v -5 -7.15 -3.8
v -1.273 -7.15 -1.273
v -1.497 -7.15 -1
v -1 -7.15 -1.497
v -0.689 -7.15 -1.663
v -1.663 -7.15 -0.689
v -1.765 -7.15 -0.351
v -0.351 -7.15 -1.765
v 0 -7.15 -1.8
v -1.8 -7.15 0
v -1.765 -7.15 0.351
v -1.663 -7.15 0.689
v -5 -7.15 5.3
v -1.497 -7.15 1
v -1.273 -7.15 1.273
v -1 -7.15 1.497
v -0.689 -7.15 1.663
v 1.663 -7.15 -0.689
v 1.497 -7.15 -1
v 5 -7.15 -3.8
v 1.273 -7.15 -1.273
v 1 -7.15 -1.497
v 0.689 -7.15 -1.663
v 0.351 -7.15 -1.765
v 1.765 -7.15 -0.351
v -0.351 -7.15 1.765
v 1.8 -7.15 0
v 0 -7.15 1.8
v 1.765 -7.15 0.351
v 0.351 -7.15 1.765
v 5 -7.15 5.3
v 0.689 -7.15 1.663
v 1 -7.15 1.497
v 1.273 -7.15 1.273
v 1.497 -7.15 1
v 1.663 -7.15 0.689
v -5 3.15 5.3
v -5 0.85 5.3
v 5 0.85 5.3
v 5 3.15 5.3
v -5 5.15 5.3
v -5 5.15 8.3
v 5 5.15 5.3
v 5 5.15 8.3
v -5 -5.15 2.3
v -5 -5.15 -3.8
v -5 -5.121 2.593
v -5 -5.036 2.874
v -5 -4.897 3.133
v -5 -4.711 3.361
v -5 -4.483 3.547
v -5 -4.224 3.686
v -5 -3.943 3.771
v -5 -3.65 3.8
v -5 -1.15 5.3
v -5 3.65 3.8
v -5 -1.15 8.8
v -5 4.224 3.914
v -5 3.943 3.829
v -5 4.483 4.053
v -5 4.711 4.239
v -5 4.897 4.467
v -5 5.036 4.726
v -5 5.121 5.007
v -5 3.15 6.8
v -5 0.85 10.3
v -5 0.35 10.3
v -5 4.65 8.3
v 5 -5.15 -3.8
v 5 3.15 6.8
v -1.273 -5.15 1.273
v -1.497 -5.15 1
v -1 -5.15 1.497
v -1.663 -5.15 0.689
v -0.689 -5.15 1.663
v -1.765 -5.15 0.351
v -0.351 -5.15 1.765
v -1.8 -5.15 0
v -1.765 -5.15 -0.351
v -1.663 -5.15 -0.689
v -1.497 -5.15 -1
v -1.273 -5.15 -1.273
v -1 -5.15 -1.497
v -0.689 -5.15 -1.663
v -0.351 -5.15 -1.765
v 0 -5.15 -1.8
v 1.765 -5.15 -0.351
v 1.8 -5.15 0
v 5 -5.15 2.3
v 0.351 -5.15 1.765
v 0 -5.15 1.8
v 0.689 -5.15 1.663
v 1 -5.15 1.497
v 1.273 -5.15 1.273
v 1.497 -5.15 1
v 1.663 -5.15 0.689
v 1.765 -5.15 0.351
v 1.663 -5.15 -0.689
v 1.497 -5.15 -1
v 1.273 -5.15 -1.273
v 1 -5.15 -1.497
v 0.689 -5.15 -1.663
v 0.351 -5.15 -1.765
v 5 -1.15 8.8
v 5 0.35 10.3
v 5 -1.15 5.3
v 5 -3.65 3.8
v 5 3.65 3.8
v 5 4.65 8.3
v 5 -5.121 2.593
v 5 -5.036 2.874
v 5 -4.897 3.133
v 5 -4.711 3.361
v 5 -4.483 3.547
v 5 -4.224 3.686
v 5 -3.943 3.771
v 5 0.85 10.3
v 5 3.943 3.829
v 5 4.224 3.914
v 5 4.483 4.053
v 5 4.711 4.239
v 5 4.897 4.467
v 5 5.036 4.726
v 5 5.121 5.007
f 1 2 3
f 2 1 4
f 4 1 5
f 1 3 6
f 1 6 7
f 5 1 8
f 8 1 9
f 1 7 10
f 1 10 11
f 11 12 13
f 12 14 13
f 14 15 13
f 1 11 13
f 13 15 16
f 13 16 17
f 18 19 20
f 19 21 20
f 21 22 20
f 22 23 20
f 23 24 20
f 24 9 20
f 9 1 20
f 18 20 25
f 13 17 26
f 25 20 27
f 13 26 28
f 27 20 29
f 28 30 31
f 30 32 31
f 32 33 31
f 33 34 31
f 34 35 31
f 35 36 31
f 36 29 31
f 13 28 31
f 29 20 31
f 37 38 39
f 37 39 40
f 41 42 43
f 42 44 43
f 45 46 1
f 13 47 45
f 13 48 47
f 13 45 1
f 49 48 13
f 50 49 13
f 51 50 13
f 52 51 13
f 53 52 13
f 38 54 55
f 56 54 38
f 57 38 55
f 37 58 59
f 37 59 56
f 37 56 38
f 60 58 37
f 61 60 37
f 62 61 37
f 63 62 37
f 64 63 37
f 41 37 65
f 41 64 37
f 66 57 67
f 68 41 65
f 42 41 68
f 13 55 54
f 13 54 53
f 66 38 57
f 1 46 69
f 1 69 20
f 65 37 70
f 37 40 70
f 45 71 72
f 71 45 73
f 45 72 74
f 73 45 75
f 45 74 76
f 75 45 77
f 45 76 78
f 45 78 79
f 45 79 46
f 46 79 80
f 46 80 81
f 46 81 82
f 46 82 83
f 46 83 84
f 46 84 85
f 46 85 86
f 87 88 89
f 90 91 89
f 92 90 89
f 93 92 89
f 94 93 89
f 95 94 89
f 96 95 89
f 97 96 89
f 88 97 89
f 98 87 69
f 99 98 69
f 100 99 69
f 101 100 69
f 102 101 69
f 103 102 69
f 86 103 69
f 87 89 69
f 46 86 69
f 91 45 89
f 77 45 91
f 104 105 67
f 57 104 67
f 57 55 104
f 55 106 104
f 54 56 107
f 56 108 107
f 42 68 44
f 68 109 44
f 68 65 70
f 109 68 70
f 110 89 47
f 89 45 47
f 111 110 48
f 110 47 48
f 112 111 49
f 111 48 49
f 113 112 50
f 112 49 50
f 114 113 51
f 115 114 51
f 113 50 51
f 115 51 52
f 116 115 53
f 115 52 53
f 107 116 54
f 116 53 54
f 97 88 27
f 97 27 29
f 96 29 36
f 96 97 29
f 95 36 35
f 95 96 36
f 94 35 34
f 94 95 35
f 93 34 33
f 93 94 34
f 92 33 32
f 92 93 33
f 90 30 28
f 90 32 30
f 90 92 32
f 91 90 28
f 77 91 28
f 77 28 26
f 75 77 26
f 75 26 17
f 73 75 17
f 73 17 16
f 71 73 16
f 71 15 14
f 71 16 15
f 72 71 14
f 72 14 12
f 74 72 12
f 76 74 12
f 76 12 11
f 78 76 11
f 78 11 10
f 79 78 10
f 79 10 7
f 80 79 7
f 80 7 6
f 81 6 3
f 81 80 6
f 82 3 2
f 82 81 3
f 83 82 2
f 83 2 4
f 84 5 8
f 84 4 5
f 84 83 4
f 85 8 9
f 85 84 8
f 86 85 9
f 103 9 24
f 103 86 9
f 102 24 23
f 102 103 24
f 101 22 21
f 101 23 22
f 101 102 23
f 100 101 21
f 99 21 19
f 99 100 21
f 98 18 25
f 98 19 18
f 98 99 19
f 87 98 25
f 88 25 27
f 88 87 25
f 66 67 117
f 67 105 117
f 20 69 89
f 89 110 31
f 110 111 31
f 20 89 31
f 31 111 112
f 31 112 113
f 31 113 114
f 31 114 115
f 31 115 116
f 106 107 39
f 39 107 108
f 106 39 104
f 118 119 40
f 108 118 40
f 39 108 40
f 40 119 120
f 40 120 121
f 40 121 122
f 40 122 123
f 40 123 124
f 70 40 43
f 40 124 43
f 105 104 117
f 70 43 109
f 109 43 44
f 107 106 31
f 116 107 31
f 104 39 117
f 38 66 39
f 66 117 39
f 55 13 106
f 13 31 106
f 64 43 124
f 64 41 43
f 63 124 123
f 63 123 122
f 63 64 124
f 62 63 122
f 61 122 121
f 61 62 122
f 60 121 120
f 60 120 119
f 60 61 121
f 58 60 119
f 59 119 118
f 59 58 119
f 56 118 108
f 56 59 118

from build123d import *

# Parameters (mm, degrees)
BOSS_EXTRUDE1_DEPTH     = 5
SKETCH2_R               = 1.8
CUT_EXTRUDE1_DEPTH      = 8.15
CUT_EXTRUDE1_DEPTH_BACK = 6.15
CHAMFER2_SIZE           = 1.5
FILLET1_R               = 1.5


with BuildPart() as part:
    # Sketch1 → Boss-Extrude1 (new body, symmetric)
    with BuildSketch(Plane(origin=(0, 0, 0), x_dir=(0, 0, -1), z_dir=(1, 0, 0))):
        Polygon((-8.3, 5.15), (-3.8, 5.15), (-3.8, -5.15), (3.8, -5.15), (3.8, -7.15), (-5.3, -7.15), (-5.3, -1.15), (-10.3, -1.15), (-10.3, 0.85), (-5.3, 0.85), (-5.3, 3.15), (-8.3, 3.15), align=None)
    extrude(amount=BOSS_EXTRUDE1_DEPTH, both=True)

    # Sketch2 → Cut-Extrude1 (cut, two sides)
    with BuildSketch(Plane(origin=(0, 0, 5.3), x_dir=(1, 0, 0), z_dir=(0, -1, 0))) as cut_extrude1_sk:
        with Locations((0, -5.3)):
            Circle(SKETCH2_R)
    extrude(amount=CUT_EXTRUDE1_DEPTH, mode=Mode.SUBTRACT)
    extrude(cut_extrude1_sk.sketch, amount=-CUT_EXTRUDE1_DEPTH_BACK, mode=Mode.SUBTRACT)

    # Chamfer2
    chamfer2_edges = [part.edges().sort_by_distance(p)[0] for p in [
        (0, -1.15, 10.3),
        (0, 3.15, 8.3),
    ]]
    chamfer(chamfer2_edges, length=CHAMFER2_SIZE)

    # Fillet1
    fillet1_edges = [part.edges().sort_by_distance(p)[0] for p in [
        (0, 5.15, 3.8),
        (0, -5.15, 3.8),
    ]]
    fillet(fillet1_edges, radius=FILLET1_R)


solid = part.part
